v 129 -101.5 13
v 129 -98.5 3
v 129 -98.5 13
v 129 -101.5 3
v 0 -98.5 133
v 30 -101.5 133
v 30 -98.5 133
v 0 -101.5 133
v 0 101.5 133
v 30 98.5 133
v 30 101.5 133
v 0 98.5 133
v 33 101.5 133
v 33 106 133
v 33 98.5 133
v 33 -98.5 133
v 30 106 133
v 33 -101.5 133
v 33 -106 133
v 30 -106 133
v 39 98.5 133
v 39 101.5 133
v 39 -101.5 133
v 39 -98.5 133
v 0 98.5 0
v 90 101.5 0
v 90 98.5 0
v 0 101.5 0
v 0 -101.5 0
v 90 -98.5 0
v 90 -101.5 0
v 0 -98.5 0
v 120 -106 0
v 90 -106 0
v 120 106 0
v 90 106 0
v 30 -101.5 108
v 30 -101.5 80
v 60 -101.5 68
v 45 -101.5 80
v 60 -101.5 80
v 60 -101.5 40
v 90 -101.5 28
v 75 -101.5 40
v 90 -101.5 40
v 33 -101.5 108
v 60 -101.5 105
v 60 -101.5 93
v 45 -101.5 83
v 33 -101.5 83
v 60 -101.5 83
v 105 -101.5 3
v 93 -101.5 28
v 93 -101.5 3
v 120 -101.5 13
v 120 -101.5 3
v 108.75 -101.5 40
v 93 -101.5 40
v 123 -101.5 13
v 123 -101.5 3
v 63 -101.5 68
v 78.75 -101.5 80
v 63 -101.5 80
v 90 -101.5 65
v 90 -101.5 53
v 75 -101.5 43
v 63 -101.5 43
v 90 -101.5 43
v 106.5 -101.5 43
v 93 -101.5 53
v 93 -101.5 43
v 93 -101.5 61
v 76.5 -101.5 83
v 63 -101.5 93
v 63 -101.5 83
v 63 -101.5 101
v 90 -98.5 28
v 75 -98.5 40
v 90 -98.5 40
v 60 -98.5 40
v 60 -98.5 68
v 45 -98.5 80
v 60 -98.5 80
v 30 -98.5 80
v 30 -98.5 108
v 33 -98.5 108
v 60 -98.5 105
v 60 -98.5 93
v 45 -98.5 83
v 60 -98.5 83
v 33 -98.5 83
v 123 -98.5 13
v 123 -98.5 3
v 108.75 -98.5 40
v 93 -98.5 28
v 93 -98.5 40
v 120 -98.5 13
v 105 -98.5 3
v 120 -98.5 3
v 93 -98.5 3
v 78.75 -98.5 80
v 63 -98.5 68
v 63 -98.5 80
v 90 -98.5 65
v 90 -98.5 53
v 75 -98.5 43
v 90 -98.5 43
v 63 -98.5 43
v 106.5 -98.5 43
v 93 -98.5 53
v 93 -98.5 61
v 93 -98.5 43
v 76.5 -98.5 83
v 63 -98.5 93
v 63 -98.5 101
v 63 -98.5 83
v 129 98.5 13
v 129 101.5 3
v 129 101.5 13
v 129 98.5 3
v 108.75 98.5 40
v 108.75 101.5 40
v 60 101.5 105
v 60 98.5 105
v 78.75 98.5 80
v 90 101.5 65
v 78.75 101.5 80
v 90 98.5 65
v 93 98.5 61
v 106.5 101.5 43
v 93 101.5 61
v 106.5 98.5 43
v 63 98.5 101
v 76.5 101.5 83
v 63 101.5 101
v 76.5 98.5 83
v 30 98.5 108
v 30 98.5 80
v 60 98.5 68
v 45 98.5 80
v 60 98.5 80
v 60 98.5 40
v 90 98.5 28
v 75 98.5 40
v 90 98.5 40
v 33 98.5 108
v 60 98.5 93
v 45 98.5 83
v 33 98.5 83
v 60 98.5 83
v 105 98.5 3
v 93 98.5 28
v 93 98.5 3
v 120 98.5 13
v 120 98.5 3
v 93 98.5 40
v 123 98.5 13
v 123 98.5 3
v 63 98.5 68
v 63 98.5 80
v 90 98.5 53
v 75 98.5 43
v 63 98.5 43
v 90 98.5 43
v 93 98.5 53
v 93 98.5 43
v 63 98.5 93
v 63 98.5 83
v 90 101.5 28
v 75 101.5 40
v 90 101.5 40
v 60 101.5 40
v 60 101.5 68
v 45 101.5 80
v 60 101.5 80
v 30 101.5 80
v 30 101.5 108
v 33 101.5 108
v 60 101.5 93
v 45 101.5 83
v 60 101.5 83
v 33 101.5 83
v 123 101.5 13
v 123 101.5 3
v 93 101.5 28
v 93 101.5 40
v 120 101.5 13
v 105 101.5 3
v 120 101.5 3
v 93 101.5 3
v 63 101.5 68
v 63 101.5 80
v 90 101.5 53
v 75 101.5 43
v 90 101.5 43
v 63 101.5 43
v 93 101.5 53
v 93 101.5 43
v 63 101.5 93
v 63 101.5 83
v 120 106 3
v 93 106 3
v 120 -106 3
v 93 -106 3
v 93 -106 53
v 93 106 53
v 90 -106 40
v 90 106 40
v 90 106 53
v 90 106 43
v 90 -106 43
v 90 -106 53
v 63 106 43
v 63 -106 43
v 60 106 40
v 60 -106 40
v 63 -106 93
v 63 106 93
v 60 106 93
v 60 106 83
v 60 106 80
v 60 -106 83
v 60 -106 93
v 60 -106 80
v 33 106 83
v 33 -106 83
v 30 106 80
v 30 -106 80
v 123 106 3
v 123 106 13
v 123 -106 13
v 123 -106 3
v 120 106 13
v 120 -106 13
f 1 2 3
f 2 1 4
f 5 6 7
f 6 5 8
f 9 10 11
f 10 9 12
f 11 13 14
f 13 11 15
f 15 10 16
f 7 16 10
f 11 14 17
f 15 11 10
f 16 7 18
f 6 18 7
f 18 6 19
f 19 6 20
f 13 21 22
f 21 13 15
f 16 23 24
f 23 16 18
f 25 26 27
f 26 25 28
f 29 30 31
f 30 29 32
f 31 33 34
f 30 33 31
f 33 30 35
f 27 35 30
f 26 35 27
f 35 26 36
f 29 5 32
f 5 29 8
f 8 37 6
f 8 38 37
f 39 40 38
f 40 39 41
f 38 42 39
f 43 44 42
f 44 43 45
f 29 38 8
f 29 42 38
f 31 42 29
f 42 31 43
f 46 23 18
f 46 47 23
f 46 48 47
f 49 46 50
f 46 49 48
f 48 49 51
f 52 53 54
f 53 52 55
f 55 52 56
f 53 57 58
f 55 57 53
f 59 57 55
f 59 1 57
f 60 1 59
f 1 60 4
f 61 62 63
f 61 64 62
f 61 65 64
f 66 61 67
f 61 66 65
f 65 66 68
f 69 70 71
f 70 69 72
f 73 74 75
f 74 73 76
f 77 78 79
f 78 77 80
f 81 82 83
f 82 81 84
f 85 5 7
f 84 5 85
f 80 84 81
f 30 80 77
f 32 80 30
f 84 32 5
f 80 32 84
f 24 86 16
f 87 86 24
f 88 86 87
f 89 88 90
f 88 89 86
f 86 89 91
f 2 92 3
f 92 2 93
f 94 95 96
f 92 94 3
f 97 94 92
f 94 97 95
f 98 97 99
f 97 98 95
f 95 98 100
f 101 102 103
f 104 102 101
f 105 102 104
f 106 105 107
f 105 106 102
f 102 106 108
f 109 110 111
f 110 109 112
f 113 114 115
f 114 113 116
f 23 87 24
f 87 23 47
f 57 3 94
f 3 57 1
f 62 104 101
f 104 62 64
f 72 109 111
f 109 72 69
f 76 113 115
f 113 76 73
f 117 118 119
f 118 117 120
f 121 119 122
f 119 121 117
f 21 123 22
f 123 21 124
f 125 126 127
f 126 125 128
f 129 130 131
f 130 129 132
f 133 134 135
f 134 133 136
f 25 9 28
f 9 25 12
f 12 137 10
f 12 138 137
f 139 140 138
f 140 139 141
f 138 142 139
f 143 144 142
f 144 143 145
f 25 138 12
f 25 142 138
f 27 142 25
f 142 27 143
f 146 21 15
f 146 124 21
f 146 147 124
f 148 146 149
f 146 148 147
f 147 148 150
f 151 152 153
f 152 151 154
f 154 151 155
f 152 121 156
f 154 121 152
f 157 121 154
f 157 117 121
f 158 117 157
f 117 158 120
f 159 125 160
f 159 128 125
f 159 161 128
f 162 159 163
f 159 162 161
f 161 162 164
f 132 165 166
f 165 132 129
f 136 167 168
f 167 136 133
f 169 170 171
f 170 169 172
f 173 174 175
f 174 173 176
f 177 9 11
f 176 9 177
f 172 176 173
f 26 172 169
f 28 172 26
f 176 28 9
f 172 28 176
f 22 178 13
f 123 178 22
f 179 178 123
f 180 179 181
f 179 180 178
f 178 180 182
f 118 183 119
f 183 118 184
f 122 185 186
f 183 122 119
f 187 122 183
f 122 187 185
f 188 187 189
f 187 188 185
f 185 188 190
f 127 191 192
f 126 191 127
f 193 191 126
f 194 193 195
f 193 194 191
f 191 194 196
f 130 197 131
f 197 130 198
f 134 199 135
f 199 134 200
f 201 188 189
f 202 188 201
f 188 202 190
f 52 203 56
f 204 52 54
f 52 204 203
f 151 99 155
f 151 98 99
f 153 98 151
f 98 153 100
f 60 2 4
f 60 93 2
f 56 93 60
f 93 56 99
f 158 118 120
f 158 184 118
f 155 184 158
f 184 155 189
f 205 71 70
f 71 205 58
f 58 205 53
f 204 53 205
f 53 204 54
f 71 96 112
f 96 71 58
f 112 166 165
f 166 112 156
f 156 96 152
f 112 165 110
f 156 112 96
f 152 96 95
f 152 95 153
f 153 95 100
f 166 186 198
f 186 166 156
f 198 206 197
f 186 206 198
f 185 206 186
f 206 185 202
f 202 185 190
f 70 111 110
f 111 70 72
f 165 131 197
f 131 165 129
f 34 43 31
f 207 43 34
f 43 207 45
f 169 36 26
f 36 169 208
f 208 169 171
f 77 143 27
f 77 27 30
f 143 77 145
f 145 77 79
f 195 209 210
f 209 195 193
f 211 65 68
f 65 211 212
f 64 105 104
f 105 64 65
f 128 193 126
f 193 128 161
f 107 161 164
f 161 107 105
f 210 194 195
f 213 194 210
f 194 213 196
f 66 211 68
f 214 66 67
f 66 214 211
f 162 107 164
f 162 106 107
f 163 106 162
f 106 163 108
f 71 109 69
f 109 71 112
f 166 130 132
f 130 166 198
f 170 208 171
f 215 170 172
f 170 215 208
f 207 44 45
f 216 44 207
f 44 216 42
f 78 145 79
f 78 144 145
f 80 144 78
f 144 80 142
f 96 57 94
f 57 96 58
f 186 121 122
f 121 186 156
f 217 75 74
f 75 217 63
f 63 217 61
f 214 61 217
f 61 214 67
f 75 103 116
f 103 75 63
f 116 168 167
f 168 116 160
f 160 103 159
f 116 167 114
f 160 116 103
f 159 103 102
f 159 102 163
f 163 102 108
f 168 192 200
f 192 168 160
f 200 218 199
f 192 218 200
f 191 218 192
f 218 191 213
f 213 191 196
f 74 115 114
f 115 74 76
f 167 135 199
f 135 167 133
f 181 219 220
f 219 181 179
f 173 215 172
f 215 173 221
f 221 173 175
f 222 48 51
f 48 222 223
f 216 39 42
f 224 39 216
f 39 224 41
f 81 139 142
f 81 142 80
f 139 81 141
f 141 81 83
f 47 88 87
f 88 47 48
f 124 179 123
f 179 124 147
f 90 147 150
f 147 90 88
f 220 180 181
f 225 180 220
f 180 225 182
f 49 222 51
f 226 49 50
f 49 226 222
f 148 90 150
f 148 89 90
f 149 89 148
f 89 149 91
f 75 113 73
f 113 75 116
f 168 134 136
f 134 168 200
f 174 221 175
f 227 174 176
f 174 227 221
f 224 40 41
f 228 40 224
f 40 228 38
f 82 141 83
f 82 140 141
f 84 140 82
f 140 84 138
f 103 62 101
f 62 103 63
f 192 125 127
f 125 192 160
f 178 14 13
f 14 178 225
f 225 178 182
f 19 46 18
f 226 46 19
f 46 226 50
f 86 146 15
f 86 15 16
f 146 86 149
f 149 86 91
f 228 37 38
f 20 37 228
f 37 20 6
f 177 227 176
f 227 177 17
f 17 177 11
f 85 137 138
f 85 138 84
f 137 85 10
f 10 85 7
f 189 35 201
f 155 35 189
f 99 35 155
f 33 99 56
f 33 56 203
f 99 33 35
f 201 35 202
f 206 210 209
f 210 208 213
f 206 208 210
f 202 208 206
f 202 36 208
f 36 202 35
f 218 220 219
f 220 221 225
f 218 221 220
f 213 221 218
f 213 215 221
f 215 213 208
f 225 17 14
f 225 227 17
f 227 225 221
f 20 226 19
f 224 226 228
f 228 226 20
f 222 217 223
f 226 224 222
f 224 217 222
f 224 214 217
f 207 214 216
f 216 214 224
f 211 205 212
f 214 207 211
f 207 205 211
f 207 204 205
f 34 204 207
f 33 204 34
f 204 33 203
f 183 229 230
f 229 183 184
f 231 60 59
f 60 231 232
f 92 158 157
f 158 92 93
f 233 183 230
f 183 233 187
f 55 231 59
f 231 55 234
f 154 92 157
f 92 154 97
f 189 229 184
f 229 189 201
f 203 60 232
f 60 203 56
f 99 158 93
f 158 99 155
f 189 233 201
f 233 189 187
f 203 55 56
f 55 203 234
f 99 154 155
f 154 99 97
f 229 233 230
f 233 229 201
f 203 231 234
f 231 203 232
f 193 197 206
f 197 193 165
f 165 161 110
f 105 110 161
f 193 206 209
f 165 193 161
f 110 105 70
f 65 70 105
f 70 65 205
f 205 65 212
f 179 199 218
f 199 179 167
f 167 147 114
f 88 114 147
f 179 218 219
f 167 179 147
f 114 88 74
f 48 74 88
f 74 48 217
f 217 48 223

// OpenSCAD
/**
Configuration variables
**/
materialThicknessMM = 3;

noOfShelf = 3;
shelfDepthMM = 30;
shelfHeightMM = 40;
shelfWidthMM = 200;
shelfLipHeightMM = 10;

shelfSidePaddingMM = 6;
shelfBackPaddingMM = 30;
shelfFrontPaddingMM = 6;

/**
Generate variables (DO NOT TOUCH)
**/
fullShelfDepth = (shelfDepthMM * noOfShelf) + shelfBackPaddingMM;
fullShelfWidth = shelfWidthMM + (shelfSidePaddingMM * 2);
leftSideY = -(fullShelfWidth / 2) + shelfSidePaddingMM;
rightSideY = (fullShelfWidth / 2) - shelfSidePaddingMM;

module sidePiece() {
  translate([0, -(materialThicknessMM / 2), 0]) {
  color([10 / 255, 189 / 255, 227 / 255,0.5]) polyhedron (
    points = [
        [0, 0, 0],
        [fullShelfDepth + materialThicknessMM + shelfFrontPaddingMM, 0, 0],
        [fullShelfDepth + materialThicknessMM + shelfFrontPaddingMM, 0, materialThicknessMM + shelfLipHeightMM],
        [materialThicknessMM + shelfFrontPaddingMM + shelfBackPaddingMM, 0, (shelfHeightMM * noOfShelf) + shelfLipHeightMM + materialThicknessMM],
        [0, 0, (shelfHeightMM * noOfShelf) + shelfLipHeightMM + materialThicknessMM],
    
        [0, materialThicknessMM, 0],
        [fullShelfDepth + materialThicknessMM + shelfFrontPaddingMM, materialThicknessMM, 0],
        [fullShelfDepth + materialThicknessMM + shelfFrontPaddingMM, materialThicknessMM, materialThicknessMM + shelfLipHeightMM],
        [materialThicknessMM + shelfFrontPaddingMM + shelfBackPaddingMM, materialThicknessMM, (shelfHeightMM * noOfShelf) + shelfLipHeightMM + materialThicknessMM],
        [0, materialThicknessMM, (shelfHeightMM * noOfShelf) + shelfLipHeightMM + materialThicknessMM],
    ],
    faces = [
        [0, 4, 3, 2, 1], // Left side
        [5, 9, 4, 0], // Back face
        [0, 1, 6, 5], // Bottom face
        [1, 2, 7, 6], // Front face
        [2, 3, 8, 7], // Angle front face
        [3, 4, 9, 8], // Top face
        [5, 6, 7, 8, 9], // Right side
    ]
  );
  }
}

module positionSides() {
    translate([0, leftSideY, 0]) {
        sidePiece();
    }

    translate([0, rightSideY, 0]) {
        sidePiece();
    }
}

module shelfBaseTrackAtLevel(level) {
    cutoutX = fullShelfDepth - (shelfDepthMM / 2) - (level * shelfDepthMM);
    cutoutZ = (level * shelfHeightMM);
    
    cutoutWidth = materialThicknessMM * 3;
    translate([cutoutX, leftSideY - (cutoutWidth / 2), cutoutZ]) {
        color([1, 0, 0, 0]) cube([fullShelfDepth, cutoutWidth, materialThicknessMM]);
    }
    
    translate([cutoutX, rightSideY - (cutoutWidth / 2), cutoutZ]) {
        color([1, 0, 0, 0]) cube([fullShelfDepth, cutoutWidth, materialThicknessMM]);
    }
}

module shelfBackTrackAtLevel(level) {
    cutoutX = fullShelfDepth - ((level + 1) * shelfDepthMM);
    cutoutZ = materialThicknessMM + shelfLipHeightMM + ((level + 1) * shelfHeightMM) - ((shelfHeightMM + shelfLipHeightMM) / 2);
    
    cutoutWidth = materialThicknessMM * 3;
    translate([cutoutX, leftSideY - (cutoutWidth / 2), cutoutZ]) {
        color([1, 0, 0, 0]) cube([materialThicknessMM, cutoutWidth, fullShelfDepth]);
    }
    
    translate([cutoutX, rightSideY - (cutoutWidth / 2), cutoutZ]) {
        color([1, 0, 0, 0]) cube([materialThicknessMM, cutoutWidth, fullShelfDepth]);
    }
}

module sides() {
    difference() {
      positionSides();
       
       for (i = [0 : noOfShelf - 1]) {
            shelfBaseTrackAtLevel(i);
            shelfBackTrackAtLevel(i);
       }
   } 
}
 
module shelfBase() {
    difference() {
        color([95 / 255, 39 / 255, 205 / 255, 0.5]) cube([shelfDepthMM, fullShelfWidth, materialThicknessMM]);
        
        translate([-materialThicknessMM ,shelfSidePaddingMM - (materialThicknessMM / 2), -materialThicknessMM]) {
            color([255 / 255, 159 / 255, 243 / 255, 0]) cube([(shelfDepthMM / 2) + materialThicknessMM, materialThicknessMM, materialThicknessMM * 3]);
        }
        
        translate([- materialThicknessMM, fullShelfWidth - shelfSidePaddingMM - (materialThicknessMM / 2), -materialThicknessMM]) {
            color([255 / 255, 159 / 255, 243 / 255, 0]) cube([(shelfDepthMM / 2) + materialThicknessMM, materialThicknessMM, materialThicknessMM * 3]);
        }
    }
}

module shelfBaseAtLevel(level) {
    shelfX = fullShelfDepth - shelfDepthMM - (level * shelfDepthMM);
    shelfY = -(fullShelfWidth / 2);
    shelfZ = (level * shelfHeightMM);
    
    translate([shelfX, shelfY, shelfZ]) {
        shelfBase();
    }
}

module shelfBases() {
    for (i = [0 : noOfShelf - 1]) {
        shelfBaseAtLevel(i);
    }
}

module shelfBack(shelfHeight) {
    difference() {
        color([255 / 255, 159 / 255, 67 / 255, 0.5]) cube([materialThicknessMM, fullShelfWidth, shelfHeight]);
        
        translate([-materialThicknessMM ,shelfSidePaddingMM - (materialThicknessMM / 2), -materialThicknessMM]) {
                color([255 / 255, 159 / 255, 243 / 255, 0]) cube([materialThicknessMM * 3, materialThicknessMM, (shelfHeight / 2) + materialThicknessMM]);
            }
            
        translate([- materialThicknessMM, fullShelfWidth - shelfSidePaddingMM - (materialThicknessMM / 2), -materialThicknessMM]) {
                color([255 / 255, 159 / 255, 243 / 255, 0]) cube([materialThicknessMM * 3, materialThicknessMM, (shelfHeight / 2) + materialThicknessMM]);
            }
        }
}

module shelfBackAtLevel(level) {
    shelfX = fullShelfDepth - (level * shelfDepthMM);
    if (level > 0) {
        shelfZ = ((level - 1) * shelfHeightMM);
        translate([shelfX, -(fullShelfWidth / 2), shelfZ + materialThicknessMM]) {
            shelfBack(shelfLipHeightMM + shelfHeightMM);
        }
    } else {
        shelfZ = 0;
        translate([shelfX, -(fullShelfWidth / 2), shelfZ + materialThicknessMM]) {
            shelfBack(shelfLipHeightMM);
        }
    }
}

module shelfBacks() {
    for (i = [0 : noOfShelf]) {
        shelfBackAtLevel(i);
    }
}

sides();
shelfBases();
shelfBacks();

// Shelf front
/* translate([fullShelfDepth, -(fullShelfWidth / 2), 0]) {
    color([255 / 255, 159 / 255, 67 / 255, 0.5]) cube([materialThicknessMM, fullShelfWidth, materialThicknessMM + shelfLipHeightMM]);
}*/
